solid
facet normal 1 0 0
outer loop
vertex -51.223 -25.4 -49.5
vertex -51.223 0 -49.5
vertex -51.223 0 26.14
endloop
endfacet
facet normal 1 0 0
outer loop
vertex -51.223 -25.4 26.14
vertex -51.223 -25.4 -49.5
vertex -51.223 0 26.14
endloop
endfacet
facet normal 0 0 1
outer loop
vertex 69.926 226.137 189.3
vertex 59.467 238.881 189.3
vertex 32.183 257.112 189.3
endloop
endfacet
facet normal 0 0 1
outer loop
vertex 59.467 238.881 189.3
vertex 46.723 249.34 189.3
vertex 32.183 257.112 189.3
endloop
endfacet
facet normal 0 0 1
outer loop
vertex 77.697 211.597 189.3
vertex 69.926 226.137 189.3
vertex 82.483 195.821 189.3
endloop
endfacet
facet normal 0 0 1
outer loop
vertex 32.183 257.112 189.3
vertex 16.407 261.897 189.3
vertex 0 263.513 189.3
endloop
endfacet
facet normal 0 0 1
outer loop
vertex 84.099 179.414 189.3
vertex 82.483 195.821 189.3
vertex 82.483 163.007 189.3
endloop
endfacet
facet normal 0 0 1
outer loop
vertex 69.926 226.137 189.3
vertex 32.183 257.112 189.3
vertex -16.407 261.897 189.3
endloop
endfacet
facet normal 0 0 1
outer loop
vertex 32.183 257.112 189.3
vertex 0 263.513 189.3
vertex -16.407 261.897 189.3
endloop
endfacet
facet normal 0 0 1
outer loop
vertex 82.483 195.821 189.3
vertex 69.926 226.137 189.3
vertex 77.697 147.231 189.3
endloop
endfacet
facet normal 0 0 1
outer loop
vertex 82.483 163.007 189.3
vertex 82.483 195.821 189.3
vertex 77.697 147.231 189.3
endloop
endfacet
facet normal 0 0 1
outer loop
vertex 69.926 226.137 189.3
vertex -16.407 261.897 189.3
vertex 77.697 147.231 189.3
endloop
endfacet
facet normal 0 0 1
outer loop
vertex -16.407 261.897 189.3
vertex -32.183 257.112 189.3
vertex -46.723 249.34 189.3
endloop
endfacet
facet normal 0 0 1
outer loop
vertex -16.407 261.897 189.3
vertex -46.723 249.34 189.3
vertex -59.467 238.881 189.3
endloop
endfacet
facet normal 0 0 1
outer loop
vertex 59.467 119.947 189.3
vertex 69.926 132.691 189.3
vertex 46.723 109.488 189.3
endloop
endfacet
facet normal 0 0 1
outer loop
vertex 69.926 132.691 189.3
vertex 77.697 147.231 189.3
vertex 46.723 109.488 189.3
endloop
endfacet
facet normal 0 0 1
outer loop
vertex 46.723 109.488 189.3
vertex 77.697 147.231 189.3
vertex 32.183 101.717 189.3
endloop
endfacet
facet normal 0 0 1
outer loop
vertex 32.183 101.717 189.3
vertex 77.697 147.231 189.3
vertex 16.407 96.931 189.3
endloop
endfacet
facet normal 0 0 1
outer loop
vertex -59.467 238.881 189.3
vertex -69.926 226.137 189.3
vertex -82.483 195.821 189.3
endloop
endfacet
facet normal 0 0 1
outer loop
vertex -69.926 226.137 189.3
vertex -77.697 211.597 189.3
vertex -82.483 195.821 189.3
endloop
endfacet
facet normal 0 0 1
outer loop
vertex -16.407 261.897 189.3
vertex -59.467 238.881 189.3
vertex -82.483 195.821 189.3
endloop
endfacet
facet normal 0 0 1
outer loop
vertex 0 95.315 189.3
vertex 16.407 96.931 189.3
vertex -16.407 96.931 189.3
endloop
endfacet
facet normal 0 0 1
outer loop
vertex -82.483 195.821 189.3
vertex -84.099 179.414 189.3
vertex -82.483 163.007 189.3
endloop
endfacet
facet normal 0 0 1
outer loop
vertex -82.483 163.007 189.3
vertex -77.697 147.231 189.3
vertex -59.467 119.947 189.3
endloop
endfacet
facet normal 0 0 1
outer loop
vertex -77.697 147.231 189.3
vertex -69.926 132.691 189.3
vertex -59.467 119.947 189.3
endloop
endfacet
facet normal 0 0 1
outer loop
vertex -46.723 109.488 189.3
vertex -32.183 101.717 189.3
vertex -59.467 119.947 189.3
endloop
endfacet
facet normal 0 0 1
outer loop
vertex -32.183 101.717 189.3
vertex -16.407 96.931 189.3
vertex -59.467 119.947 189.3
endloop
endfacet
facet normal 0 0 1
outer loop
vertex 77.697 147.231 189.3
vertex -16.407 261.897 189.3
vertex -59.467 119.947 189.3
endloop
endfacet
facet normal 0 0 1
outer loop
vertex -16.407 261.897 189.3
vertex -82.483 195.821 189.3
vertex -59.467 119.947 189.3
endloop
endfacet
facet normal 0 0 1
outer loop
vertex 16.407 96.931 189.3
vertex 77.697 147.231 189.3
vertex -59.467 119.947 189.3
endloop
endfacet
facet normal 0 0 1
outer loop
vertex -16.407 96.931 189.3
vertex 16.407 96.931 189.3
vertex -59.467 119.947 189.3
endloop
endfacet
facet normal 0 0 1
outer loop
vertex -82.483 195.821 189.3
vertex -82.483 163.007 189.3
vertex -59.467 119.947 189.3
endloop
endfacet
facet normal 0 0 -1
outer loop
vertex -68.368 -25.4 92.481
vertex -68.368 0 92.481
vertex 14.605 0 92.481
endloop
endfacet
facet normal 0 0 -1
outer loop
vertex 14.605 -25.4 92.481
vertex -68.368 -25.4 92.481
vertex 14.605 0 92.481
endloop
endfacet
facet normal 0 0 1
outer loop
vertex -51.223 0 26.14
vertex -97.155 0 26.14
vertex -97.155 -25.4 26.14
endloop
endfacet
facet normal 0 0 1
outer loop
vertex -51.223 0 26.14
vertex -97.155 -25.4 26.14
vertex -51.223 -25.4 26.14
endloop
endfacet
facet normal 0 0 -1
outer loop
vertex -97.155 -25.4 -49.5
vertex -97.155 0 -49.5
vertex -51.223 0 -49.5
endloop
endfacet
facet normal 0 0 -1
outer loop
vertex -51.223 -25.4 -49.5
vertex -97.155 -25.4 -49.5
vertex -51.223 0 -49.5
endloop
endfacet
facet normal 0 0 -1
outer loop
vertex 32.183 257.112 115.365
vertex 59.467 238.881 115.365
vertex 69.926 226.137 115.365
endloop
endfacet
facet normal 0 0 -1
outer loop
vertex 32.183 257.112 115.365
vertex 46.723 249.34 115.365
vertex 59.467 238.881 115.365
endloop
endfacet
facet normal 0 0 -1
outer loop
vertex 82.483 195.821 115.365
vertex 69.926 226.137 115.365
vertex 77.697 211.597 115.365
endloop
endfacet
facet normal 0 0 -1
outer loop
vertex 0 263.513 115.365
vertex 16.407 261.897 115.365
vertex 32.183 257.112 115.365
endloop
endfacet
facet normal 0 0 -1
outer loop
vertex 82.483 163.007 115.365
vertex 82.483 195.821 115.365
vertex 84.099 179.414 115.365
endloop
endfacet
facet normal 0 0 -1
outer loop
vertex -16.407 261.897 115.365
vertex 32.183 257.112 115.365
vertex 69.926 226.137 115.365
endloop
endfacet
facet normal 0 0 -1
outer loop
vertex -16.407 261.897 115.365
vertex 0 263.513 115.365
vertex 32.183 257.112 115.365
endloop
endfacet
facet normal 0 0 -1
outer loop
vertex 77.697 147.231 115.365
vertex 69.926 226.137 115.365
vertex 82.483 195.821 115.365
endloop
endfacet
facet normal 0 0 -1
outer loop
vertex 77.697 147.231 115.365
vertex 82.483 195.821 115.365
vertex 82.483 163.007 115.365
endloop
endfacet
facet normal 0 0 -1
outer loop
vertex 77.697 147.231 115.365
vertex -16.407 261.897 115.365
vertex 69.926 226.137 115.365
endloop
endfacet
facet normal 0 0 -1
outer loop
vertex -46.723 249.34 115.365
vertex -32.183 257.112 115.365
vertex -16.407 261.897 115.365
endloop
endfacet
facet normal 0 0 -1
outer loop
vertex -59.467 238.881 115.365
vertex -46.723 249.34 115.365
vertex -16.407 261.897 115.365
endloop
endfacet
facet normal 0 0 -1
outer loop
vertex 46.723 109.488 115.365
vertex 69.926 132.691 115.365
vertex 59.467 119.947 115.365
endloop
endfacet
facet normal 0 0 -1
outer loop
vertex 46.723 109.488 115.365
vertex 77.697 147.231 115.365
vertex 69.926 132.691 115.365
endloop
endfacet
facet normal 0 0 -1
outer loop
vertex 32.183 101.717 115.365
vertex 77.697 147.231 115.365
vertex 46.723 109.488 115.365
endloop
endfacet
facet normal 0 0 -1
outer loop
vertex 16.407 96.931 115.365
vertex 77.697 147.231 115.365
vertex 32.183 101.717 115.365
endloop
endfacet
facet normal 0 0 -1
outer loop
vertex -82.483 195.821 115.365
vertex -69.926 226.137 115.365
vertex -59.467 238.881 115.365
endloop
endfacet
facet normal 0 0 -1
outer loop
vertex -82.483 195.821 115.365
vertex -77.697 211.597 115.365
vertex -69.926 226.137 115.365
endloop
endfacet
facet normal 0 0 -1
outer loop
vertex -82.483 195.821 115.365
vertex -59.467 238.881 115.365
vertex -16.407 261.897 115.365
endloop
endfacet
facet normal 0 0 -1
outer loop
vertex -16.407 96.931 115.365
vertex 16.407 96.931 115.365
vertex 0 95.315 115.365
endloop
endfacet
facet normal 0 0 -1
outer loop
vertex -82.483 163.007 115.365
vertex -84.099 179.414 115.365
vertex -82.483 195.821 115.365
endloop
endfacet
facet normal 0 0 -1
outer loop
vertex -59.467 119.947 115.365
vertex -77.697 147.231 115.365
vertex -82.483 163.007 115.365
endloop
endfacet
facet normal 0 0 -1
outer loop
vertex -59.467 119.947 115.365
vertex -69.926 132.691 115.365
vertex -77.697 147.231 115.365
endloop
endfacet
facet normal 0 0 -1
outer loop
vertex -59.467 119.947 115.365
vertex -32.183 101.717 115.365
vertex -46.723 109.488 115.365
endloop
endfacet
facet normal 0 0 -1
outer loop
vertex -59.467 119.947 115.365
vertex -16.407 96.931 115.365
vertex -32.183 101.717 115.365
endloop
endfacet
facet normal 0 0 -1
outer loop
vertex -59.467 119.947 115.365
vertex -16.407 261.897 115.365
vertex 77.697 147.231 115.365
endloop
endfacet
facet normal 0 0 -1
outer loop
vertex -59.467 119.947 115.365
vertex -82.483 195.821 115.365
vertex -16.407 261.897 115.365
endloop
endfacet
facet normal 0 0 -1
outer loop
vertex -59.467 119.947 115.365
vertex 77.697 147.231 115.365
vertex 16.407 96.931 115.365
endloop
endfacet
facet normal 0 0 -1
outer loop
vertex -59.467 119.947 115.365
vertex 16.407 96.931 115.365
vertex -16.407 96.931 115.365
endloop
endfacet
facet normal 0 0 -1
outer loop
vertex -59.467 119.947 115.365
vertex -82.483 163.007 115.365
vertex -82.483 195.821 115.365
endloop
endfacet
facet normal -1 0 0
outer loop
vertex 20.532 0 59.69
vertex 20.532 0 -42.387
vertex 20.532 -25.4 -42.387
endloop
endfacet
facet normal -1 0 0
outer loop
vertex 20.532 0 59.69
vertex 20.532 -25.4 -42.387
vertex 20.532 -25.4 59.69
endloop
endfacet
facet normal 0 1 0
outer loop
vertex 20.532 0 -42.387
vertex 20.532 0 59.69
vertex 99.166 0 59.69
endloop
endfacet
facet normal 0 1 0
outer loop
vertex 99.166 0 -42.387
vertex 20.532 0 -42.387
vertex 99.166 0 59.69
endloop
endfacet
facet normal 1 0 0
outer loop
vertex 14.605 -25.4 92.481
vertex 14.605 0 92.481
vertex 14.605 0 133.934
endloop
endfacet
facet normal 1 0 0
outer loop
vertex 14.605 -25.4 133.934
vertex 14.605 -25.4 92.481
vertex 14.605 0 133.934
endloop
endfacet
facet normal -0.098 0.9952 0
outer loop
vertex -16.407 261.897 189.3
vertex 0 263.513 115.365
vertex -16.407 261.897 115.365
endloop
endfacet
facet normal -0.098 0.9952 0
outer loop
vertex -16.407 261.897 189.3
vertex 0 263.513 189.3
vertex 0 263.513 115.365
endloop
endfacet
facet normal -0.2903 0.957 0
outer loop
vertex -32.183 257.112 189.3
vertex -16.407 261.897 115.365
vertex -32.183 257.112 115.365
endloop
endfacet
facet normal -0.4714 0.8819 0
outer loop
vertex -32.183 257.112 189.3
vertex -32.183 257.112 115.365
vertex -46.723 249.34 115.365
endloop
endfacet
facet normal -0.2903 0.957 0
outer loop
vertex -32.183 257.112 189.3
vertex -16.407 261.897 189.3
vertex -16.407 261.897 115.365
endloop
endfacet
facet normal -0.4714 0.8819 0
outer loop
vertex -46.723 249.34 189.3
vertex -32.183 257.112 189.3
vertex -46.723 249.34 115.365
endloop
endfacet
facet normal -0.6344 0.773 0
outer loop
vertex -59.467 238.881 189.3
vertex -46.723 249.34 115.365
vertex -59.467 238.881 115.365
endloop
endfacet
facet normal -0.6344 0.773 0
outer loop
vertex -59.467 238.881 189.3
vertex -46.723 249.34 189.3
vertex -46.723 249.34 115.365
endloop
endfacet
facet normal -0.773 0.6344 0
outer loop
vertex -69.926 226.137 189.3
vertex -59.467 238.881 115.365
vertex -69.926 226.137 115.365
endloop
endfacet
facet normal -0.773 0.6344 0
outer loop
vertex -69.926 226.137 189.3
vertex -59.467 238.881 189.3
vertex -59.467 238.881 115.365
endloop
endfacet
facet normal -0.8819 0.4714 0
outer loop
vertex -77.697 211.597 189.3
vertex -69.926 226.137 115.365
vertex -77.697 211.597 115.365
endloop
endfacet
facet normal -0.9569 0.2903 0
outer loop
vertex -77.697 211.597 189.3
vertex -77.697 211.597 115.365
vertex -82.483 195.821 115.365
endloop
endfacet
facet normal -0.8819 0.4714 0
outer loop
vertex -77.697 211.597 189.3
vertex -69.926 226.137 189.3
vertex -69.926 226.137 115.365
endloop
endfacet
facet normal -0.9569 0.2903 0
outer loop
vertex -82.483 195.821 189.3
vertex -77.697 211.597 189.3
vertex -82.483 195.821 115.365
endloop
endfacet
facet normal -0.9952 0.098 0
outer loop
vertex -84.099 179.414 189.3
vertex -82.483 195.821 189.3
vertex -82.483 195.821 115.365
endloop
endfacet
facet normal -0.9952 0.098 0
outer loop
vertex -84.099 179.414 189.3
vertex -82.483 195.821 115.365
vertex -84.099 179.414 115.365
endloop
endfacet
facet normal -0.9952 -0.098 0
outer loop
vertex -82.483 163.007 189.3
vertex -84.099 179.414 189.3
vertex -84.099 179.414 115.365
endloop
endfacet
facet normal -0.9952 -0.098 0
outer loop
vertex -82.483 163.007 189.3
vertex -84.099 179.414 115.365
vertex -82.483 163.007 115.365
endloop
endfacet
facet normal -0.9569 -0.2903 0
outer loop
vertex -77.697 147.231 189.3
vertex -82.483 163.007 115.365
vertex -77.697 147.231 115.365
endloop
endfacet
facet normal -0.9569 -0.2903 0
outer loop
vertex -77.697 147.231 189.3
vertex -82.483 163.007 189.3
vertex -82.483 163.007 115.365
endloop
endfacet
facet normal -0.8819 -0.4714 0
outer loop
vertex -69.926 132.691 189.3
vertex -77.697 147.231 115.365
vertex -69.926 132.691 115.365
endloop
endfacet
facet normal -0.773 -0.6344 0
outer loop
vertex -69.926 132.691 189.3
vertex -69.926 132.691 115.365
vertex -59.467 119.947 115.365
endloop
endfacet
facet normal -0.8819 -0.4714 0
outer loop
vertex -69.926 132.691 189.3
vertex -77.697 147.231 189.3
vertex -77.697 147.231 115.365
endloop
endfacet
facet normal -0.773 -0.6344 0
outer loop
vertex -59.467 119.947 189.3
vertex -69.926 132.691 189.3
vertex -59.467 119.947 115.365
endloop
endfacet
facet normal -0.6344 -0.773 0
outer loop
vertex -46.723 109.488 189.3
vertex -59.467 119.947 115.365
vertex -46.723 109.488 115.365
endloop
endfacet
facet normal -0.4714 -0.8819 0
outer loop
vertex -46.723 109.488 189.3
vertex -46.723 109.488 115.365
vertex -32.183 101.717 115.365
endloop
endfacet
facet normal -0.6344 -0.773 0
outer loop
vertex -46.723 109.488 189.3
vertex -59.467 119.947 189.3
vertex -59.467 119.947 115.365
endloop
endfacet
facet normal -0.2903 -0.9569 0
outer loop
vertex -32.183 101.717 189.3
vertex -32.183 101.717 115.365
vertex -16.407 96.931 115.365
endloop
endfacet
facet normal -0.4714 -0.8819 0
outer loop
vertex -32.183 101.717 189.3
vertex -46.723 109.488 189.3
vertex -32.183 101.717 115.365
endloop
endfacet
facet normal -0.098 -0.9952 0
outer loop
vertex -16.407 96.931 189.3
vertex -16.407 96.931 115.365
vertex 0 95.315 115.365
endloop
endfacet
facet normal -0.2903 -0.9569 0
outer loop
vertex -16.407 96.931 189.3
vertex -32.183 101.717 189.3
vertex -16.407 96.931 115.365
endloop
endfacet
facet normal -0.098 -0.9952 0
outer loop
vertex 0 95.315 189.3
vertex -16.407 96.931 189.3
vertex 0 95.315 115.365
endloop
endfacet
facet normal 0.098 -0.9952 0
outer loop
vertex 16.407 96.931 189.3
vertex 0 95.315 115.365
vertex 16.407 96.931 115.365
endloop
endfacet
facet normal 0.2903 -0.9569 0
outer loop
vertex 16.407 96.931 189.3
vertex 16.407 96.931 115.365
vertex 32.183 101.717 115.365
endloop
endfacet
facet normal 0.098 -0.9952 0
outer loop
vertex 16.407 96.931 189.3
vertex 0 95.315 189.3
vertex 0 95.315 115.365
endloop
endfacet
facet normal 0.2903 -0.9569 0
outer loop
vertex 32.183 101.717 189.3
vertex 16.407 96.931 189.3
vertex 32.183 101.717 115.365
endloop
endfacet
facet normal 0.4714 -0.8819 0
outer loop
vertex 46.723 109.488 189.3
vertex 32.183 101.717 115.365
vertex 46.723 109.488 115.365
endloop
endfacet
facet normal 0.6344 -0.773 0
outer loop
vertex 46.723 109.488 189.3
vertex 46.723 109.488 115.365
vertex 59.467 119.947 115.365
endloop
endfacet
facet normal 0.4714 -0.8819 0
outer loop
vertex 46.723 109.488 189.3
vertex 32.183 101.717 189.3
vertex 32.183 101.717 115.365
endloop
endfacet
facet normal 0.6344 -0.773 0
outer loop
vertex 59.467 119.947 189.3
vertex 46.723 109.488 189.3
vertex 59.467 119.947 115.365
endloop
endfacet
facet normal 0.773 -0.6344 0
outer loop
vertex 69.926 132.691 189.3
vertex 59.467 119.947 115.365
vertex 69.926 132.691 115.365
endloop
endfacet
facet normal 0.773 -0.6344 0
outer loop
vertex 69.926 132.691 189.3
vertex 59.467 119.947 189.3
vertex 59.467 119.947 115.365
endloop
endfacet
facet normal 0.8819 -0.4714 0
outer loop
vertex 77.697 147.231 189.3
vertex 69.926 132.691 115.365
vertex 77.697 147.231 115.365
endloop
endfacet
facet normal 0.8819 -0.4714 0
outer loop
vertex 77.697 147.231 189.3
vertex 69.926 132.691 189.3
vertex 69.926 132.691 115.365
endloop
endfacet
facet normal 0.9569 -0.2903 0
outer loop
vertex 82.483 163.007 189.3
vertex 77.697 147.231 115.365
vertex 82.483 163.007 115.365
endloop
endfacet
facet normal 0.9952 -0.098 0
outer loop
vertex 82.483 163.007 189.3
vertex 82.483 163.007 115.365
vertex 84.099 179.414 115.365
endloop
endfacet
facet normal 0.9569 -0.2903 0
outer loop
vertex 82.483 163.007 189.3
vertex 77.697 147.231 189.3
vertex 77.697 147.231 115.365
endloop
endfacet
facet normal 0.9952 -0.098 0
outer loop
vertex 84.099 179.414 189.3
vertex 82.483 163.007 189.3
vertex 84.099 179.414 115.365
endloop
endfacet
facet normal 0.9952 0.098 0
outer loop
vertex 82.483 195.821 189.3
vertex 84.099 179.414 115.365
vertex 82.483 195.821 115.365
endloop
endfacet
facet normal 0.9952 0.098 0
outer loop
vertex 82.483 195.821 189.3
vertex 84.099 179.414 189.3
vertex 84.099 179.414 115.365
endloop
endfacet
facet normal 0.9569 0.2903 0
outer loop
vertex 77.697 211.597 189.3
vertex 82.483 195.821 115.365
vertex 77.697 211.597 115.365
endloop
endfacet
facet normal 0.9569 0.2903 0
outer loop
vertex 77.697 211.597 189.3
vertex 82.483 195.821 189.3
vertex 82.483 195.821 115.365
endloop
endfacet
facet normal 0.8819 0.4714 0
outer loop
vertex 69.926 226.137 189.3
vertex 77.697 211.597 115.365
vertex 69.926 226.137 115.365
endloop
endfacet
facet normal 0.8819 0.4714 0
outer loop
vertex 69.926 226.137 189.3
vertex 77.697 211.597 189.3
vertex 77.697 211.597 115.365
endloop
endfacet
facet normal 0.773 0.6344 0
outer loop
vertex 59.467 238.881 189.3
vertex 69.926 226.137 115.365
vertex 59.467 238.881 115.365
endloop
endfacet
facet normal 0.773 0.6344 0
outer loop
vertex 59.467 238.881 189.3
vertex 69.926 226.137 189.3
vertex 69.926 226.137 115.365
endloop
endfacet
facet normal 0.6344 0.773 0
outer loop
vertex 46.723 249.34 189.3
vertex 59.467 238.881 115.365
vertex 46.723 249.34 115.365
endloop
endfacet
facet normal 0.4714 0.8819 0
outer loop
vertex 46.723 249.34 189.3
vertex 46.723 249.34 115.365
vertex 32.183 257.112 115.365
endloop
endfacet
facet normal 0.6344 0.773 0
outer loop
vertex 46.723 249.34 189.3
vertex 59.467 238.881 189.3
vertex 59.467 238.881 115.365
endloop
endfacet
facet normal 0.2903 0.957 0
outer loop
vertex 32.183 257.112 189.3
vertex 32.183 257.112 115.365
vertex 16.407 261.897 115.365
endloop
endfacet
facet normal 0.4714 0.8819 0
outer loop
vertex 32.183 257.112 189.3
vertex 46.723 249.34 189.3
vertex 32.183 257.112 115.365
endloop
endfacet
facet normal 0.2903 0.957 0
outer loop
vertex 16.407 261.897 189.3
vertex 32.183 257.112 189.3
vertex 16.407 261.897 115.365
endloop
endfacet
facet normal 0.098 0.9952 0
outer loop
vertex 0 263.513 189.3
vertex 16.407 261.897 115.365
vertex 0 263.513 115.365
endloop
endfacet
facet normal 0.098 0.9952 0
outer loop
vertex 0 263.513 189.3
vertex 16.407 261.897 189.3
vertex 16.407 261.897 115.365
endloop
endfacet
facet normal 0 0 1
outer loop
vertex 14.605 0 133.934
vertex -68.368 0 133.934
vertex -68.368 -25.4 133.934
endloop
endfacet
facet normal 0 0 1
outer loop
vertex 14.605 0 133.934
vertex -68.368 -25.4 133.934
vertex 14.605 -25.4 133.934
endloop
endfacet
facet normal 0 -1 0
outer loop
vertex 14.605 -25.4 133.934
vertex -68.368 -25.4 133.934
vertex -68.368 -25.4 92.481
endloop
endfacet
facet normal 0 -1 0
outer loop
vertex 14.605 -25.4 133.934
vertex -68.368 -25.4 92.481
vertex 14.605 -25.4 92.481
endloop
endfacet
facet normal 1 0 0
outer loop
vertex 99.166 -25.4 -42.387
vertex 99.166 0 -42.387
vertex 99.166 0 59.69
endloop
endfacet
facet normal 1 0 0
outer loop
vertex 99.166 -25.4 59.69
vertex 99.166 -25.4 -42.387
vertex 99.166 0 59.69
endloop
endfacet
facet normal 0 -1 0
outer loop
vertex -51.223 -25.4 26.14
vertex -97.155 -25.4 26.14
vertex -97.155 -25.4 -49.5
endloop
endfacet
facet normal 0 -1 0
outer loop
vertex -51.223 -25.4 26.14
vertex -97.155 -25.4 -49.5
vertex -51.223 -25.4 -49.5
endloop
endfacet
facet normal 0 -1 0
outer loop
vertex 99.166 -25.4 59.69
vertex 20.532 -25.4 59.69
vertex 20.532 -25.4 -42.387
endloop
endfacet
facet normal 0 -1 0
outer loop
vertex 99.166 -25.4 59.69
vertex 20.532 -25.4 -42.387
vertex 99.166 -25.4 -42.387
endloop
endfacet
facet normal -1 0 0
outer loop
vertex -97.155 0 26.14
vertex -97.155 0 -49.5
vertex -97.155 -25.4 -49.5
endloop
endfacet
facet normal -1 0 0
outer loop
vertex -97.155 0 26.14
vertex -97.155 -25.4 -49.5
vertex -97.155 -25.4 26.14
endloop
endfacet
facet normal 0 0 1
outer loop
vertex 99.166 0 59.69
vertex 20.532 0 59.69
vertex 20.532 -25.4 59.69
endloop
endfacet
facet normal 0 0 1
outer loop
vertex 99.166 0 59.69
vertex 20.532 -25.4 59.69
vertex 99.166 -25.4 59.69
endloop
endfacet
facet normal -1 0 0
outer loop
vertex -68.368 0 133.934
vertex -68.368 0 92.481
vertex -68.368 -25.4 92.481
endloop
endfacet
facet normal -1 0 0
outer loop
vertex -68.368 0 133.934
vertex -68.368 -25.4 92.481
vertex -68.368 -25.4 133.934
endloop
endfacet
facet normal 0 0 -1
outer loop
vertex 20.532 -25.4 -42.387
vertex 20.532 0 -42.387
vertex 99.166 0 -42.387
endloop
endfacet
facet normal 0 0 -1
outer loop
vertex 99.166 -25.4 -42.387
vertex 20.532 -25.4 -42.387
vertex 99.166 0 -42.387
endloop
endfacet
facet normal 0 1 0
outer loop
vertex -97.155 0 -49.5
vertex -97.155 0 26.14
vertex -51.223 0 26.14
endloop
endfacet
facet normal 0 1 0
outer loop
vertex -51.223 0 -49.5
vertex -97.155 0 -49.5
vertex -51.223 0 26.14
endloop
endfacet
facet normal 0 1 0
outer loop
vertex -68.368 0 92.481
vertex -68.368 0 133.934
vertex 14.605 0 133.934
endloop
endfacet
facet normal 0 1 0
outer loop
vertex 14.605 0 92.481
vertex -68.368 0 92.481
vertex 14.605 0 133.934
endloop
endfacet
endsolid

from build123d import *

# Parameters (mm, degrees)
F1_W     = 82.973331
F1_H     = 41.452661
F1_W_2   = 45.931667
F1_H_2   = 75.640671
F1_W_3   = 78.634173
F1_H_3   = 102.077767
F2_DEPTH = 25.4
F3_W     = 84.099084
F3_H     = 73.935144


with BuildPart() as f2:
    # F1 (on Front) → F2 (new body)
    with BuildSketch(Plane.XZ):
        with Locations((-26.881694, 113.207408)):
            Rectangle(F1_W, F1_H)
        with Locations((-74.189186, -11.679921)):
            Rectangle(F1_W_2, F1_H_2)
        with Locations((59.848733, 8.651405)):
            Rectangle(F1_W_3, F1_H_3)
    extrude(amount=F2_DEPTH)


with BuildPart() as f0:
    # F3 (on Right) → F0 (revolve)
    with BuildSketch(Plane.YZ):
        with Locations((221.463665, 152.332369)):
            Rectangle(F3_W, F3_H)
    revolve(axis=Axis((0, 179.414123, 152.332369), (0, 0, 1)))


solid = Compound([f2.part, f0.part])
